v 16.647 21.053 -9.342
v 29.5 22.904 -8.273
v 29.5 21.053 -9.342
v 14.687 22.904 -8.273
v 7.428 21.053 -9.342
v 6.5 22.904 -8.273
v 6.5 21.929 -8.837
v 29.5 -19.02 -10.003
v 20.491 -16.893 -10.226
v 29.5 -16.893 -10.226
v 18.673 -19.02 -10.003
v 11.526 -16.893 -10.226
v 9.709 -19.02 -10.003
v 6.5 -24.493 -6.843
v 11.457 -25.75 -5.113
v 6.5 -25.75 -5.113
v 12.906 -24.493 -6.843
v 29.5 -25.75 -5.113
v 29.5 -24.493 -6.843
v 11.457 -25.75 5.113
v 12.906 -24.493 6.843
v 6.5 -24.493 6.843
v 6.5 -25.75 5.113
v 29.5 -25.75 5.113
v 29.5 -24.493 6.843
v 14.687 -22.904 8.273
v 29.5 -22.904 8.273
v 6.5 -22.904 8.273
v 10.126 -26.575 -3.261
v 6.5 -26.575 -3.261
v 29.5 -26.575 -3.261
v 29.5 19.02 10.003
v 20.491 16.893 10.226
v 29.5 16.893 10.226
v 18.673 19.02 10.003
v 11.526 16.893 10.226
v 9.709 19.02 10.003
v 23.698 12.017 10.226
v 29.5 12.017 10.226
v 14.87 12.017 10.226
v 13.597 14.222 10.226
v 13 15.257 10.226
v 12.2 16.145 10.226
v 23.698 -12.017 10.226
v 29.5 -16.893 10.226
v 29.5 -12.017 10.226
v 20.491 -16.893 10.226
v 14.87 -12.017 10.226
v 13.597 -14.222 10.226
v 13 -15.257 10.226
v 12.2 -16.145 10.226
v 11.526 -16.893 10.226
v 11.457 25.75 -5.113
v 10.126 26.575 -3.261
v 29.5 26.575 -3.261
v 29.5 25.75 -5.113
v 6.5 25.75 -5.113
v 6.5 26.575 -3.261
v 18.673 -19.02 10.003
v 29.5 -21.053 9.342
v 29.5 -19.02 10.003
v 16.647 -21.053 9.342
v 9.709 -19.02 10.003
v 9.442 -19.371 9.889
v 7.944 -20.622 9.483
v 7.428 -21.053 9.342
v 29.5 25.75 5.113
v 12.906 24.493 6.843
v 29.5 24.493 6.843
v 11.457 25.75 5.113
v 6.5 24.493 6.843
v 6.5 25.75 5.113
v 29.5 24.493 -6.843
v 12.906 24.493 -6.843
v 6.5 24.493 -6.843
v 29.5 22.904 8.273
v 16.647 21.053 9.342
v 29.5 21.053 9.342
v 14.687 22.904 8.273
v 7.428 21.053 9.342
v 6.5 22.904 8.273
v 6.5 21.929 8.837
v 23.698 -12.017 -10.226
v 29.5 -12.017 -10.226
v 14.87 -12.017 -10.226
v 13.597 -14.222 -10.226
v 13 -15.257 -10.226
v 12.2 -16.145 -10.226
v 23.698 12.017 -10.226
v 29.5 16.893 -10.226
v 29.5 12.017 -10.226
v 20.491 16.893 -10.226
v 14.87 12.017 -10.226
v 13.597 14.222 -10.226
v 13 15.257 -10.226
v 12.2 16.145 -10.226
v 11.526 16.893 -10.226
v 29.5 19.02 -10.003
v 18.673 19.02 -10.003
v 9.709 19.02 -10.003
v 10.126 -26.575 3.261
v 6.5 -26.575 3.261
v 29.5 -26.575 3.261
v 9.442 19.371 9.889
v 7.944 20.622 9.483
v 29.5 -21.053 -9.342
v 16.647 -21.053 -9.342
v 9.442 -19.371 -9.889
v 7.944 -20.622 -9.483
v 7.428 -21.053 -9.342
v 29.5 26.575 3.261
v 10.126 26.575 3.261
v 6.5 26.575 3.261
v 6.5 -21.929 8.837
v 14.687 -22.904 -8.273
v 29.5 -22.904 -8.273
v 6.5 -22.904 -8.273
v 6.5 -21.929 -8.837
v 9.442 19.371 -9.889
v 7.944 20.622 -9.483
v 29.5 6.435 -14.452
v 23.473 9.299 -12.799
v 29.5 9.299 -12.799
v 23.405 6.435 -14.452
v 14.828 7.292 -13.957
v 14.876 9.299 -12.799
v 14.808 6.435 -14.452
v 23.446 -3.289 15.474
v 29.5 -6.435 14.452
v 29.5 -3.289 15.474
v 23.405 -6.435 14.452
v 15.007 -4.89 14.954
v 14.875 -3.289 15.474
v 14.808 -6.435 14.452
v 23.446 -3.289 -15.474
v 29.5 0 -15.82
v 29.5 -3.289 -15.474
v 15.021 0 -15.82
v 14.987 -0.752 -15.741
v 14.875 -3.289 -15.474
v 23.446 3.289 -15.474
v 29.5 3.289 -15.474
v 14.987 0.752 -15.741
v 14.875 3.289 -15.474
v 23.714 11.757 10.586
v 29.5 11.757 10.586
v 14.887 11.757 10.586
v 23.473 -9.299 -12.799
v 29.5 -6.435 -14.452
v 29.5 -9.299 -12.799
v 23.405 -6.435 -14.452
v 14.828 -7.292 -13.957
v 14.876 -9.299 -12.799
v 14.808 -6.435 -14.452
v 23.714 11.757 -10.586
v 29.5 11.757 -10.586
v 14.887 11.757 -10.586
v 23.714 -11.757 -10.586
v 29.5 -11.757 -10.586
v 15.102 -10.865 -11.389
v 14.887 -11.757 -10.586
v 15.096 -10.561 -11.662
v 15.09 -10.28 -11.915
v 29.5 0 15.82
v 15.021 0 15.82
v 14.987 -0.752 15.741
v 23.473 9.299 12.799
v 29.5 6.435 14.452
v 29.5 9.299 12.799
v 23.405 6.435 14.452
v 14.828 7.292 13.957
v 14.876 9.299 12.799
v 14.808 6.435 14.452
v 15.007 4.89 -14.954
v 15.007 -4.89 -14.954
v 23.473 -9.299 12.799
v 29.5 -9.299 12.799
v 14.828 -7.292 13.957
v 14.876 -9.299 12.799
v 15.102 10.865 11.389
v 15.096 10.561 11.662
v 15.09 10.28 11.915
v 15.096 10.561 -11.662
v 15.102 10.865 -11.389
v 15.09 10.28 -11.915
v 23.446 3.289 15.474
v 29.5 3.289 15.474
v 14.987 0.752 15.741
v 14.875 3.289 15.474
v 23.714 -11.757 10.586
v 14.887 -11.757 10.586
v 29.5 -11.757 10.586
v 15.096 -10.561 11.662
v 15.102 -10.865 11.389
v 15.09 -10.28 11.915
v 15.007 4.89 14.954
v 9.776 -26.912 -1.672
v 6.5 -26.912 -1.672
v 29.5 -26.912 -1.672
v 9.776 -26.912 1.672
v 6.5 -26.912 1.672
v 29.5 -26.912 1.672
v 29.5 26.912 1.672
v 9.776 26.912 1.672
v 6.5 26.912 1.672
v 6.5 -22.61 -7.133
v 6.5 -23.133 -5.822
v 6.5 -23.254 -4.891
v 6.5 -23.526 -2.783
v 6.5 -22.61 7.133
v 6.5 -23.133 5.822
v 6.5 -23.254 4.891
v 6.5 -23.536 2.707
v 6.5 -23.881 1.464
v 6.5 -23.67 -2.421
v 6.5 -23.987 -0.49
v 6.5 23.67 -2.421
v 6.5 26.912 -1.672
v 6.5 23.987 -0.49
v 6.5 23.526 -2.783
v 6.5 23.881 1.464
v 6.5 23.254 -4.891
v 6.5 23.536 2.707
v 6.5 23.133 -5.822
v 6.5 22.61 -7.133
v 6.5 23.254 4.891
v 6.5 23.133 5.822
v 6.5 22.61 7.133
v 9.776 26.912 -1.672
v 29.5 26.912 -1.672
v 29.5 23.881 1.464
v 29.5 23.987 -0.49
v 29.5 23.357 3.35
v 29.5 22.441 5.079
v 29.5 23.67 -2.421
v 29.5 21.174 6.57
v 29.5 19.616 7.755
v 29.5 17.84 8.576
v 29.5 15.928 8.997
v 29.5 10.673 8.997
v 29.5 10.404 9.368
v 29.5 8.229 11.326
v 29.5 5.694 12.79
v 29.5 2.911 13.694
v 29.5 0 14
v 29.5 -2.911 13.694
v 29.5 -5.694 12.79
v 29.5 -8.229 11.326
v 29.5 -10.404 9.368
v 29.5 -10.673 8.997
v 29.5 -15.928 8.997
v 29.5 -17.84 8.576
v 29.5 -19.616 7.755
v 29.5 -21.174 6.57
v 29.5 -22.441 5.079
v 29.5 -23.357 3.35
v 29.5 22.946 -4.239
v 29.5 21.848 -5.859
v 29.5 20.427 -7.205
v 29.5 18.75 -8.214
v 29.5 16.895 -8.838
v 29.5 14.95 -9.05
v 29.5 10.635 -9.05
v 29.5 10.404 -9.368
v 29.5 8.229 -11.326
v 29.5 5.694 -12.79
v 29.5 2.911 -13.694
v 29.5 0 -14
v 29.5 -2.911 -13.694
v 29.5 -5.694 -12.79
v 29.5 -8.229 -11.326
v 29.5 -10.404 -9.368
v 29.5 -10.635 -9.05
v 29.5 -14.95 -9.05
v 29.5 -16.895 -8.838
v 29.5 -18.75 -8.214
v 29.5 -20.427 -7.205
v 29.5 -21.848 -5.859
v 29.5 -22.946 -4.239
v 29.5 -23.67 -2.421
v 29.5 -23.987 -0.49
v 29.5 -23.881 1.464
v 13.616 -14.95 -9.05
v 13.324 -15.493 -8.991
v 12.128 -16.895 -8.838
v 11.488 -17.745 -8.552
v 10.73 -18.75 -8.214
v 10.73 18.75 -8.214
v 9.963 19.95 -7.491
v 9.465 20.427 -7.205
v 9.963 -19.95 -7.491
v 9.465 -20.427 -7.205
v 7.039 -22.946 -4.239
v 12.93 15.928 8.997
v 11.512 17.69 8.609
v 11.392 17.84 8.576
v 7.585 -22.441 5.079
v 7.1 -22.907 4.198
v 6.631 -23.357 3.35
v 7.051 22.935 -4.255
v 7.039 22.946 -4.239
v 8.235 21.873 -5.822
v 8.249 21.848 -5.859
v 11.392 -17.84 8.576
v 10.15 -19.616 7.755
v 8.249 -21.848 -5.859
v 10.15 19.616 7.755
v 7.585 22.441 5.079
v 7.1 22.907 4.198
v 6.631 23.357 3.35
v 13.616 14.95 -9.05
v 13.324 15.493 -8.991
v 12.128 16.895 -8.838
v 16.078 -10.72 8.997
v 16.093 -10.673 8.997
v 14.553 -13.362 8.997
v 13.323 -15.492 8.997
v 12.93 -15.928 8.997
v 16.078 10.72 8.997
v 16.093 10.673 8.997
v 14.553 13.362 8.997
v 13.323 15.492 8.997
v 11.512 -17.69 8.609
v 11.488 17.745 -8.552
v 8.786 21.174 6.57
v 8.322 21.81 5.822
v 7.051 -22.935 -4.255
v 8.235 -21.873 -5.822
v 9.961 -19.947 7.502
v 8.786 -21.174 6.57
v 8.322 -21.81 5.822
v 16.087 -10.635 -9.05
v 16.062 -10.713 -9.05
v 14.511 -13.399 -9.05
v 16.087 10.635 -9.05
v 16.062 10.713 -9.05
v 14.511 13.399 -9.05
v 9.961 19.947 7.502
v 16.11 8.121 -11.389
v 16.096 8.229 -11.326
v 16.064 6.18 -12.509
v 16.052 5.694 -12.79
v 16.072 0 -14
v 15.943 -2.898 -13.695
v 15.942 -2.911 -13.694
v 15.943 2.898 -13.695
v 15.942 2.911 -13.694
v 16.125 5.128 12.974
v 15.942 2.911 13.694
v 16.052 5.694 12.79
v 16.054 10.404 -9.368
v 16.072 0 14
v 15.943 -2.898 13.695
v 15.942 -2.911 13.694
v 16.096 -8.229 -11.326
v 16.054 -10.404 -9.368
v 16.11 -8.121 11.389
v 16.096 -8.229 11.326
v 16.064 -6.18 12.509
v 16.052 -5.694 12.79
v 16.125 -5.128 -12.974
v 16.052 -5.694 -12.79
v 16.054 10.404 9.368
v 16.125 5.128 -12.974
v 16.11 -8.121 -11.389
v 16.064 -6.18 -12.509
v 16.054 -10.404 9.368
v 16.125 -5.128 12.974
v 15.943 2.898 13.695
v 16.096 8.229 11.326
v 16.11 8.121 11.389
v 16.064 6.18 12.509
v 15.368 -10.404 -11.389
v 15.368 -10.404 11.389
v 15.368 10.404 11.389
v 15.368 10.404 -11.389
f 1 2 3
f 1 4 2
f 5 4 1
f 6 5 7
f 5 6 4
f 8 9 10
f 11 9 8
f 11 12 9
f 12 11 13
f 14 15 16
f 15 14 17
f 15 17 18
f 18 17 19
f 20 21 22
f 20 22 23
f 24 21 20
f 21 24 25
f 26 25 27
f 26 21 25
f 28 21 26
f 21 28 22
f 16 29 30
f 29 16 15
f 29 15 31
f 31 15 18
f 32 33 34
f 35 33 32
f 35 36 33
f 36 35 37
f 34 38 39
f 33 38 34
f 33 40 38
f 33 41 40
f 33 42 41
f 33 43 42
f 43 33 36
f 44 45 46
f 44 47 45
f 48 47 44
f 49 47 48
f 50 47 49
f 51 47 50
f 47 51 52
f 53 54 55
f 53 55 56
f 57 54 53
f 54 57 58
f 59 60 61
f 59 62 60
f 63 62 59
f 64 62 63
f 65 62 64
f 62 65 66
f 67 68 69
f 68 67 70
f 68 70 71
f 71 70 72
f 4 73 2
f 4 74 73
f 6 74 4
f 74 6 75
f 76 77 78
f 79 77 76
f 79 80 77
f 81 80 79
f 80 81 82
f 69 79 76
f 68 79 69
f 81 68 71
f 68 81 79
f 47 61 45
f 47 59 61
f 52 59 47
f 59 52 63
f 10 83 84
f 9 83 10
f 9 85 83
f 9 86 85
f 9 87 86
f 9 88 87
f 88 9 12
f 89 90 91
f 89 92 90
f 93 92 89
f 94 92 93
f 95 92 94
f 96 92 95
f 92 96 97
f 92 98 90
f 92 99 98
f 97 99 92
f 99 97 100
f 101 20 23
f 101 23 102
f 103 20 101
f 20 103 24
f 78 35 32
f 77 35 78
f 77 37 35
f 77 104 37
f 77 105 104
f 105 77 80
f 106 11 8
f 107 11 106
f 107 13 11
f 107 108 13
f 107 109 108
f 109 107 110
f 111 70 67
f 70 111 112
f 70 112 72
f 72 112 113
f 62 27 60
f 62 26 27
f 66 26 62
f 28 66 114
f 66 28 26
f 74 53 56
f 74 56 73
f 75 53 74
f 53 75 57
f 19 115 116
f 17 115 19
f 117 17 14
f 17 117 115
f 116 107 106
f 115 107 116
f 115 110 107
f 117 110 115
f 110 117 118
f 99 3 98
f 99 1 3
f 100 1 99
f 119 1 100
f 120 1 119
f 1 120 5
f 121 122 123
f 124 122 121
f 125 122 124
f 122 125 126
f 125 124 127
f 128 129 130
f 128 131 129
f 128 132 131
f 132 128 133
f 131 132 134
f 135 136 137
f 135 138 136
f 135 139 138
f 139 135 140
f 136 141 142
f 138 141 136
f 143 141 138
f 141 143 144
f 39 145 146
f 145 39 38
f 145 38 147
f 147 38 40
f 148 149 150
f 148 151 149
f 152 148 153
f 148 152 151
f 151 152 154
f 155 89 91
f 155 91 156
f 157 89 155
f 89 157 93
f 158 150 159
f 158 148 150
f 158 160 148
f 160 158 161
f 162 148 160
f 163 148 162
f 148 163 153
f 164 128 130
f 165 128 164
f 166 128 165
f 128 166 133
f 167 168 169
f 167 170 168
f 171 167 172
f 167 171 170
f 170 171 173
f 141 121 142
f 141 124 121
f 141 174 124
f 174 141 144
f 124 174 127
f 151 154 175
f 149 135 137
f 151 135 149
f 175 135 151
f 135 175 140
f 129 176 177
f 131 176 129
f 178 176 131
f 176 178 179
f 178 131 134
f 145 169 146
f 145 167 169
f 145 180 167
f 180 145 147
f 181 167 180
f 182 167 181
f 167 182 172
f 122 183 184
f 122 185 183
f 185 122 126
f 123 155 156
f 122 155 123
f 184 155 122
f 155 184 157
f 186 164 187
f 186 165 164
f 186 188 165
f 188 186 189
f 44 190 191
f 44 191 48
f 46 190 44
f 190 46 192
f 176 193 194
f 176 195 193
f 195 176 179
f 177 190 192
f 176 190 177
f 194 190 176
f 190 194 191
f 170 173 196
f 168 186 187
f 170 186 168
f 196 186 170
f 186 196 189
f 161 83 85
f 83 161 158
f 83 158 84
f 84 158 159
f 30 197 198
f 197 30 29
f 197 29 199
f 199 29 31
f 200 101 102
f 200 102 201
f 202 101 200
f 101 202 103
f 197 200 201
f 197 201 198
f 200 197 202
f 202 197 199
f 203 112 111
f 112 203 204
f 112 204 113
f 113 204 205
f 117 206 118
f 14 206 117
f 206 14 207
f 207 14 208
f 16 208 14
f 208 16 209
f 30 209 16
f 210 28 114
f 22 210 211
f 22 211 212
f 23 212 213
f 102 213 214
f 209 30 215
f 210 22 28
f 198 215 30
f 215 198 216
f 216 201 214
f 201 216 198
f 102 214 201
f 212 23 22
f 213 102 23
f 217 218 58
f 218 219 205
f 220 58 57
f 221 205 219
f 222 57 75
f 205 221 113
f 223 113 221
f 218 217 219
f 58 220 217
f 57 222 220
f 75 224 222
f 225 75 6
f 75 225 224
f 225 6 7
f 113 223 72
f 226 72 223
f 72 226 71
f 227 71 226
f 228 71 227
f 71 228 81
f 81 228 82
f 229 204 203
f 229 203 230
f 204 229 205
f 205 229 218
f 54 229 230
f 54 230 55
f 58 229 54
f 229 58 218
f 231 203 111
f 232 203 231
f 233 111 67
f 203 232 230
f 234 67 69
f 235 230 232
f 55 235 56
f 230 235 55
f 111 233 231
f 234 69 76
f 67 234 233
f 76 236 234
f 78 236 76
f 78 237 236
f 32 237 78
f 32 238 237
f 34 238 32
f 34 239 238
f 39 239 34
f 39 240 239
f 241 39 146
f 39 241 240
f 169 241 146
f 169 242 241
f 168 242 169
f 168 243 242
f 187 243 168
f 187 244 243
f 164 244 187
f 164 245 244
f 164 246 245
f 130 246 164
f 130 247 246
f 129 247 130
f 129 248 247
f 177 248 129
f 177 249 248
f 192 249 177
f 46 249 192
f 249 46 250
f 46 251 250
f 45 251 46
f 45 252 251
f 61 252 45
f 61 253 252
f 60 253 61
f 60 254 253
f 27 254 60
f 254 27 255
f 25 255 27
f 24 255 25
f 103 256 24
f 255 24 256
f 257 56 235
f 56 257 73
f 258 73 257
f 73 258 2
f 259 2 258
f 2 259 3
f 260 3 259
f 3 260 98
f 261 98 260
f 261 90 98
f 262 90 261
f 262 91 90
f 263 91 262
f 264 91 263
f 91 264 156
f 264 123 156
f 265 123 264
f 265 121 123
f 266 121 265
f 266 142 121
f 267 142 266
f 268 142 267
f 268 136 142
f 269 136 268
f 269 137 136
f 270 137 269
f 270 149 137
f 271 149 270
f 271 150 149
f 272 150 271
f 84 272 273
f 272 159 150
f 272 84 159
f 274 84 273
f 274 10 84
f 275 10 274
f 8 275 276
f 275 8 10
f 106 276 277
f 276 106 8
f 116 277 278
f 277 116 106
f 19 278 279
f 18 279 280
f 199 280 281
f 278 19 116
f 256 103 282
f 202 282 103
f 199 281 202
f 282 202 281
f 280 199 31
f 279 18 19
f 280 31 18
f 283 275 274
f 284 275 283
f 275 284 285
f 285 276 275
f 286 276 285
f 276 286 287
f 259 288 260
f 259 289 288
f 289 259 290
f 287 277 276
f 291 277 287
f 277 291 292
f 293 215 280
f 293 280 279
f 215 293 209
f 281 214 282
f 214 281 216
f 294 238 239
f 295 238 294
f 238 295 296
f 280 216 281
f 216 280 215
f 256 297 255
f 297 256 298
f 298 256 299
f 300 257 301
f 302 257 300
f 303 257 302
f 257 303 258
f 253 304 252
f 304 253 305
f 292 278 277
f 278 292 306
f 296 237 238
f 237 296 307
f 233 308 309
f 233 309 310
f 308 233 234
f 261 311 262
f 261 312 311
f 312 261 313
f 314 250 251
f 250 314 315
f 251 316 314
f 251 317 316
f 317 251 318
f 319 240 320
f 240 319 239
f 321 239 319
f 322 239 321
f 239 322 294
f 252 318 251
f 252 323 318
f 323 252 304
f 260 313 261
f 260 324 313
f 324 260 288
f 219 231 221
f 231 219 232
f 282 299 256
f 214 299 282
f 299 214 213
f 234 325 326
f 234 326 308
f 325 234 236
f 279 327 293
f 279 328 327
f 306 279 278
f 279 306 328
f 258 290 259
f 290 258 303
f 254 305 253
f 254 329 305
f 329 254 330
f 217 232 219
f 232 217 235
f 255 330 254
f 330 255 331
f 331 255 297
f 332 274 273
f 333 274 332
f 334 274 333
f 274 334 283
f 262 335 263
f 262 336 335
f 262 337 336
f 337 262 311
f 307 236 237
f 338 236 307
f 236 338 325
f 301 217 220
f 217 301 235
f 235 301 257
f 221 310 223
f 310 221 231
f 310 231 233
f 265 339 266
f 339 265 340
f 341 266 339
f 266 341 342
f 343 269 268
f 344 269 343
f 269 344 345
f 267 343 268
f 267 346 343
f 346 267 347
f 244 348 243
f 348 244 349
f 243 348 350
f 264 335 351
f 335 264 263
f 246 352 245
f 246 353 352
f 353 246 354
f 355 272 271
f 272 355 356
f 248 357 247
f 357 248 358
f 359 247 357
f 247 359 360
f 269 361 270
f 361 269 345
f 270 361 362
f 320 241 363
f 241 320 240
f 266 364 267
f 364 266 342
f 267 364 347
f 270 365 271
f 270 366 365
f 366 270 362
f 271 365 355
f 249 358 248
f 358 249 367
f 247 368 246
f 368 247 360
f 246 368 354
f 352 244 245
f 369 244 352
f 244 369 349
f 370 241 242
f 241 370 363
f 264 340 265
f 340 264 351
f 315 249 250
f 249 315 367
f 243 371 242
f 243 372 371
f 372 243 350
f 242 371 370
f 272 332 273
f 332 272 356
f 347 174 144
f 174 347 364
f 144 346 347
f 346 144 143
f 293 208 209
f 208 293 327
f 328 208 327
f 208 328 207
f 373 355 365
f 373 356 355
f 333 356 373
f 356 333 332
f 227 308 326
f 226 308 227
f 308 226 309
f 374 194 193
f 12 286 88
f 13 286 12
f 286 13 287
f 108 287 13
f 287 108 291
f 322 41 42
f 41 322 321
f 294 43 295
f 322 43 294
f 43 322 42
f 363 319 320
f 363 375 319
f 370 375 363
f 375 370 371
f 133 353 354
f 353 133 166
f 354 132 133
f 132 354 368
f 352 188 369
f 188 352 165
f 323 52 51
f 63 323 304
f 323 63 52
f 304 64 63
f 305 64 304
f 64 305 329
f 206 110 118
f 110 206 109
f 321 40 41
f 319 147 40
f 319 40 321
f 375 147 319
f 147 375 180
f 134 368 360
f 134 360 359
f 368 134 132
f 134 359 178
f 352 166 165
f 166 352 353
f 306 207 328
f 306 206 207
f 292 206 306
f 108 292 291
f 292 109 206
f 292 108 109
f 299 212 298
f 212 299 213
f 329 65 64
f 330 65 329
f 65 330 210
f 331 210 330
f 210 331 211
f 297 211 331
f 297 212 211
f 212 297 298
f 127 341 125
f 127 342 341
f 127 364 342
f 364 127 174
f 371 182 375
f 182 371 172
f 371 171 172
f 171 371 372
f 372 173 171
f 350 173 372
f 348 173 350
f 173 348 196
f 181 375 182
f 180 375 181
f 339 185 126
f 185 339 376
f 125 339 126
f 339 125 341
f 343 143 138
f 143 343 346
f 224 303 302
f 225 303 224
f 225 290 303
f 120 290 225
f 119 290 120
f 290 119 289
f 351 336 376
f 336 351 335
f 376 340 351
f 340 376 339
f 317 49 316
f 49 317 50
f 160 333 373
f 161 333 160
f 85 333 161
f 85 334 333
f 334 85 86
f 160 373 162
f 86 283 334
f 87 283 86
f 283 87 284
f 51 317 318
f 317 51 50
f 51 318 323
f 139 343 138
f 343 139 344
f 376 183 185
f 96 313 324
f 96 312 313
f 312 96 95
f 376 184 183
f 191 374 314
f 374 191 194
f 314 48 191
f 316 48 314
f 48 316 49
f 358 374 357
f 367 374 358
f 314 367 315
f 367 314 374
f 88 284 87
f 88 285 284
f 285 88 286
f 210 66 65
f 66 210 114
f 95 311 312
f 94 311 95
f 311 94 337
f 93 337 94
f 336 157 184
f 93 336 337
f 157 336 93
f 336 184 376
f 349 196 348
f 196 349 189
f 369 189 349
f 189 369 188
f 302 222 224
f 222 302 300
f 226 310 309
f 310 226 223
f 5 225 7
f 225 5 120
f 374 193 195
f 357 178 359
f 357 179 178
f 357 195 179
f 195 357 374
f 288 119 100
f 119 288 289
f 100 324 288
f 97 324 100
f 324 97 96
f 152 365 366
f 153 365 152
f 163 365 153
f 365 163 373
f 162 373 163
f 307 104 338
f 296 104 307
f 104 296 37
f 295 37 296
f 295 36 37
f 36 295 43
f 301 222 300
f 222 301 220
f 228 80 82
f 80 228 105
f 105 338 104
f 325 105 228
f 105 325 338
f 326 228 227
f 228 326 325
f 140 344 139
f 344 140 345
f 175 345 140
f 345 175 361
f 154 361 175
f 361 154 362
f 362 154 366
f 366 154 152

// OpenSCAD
module semisfera(r,spessore){
    difference(){
        difference(){
        sphere(r);
        sphere(r-spessore);
        }
    
        translate([0,0,r/2])cube([r*2,r*2,r],true);
    }
}



module sferamonca(r,spessore,spazio){
    translate([0,0,spazio])
    difference(){
    translate([0,0,spessore])semisfera(r,spessore);
    cube([r*2,r*2,spazio*2],true);
    }
}

module sfeschiacciata(r,spessore,schiaccio){
sferamonca(r,spessore,schiaccio);
rotate([0,180,0])sferamonca(r,spessore,schiaccio);
}

module onex(k){
    r=k*9.05;
    l=k*24;
    //rr=13.8;
    rr=14;
    hull(){
        
        translate([0,l-r])rotate([0,90,0])cylinder(114.56,r,r,true);
        translate([0,-(l-r)])rotate([0,90,0])cylinder(114.56,r,r,true);
    }   
    rotate([0,90,0])cylinder(114.56,k*rr,k*rr,true);
}


module esterno(){
    //translate([25,0,0])cube([30,80,30],true); //esterno squadrato
    translate([18,0,0])rotate([0,0,0]) hull() //esterno del pezzo finale
    {
       r=16;
        l=27;
        h=23;
        translate([0,l-r])rotate([0,90,0])cylinder(h,r,r,true);
        translate([0,-(l-r)])rotate([0,90,0])cylinder(h,r,r,true);
    }
    
}

module esterno2(){
    intersection(){
        esterno();
        onex(1.13);
    }
}

difference(){
    esterno2();
    union(){
        translate([-8,0,0])sphere(28);
        difference(){
            sfeschiacciata(30,1,0);
            //translate([25,0,0])cube([30,50,30],true);
            esterno2();
        }
        translate([50,0,0])onex(1);
    }
}
